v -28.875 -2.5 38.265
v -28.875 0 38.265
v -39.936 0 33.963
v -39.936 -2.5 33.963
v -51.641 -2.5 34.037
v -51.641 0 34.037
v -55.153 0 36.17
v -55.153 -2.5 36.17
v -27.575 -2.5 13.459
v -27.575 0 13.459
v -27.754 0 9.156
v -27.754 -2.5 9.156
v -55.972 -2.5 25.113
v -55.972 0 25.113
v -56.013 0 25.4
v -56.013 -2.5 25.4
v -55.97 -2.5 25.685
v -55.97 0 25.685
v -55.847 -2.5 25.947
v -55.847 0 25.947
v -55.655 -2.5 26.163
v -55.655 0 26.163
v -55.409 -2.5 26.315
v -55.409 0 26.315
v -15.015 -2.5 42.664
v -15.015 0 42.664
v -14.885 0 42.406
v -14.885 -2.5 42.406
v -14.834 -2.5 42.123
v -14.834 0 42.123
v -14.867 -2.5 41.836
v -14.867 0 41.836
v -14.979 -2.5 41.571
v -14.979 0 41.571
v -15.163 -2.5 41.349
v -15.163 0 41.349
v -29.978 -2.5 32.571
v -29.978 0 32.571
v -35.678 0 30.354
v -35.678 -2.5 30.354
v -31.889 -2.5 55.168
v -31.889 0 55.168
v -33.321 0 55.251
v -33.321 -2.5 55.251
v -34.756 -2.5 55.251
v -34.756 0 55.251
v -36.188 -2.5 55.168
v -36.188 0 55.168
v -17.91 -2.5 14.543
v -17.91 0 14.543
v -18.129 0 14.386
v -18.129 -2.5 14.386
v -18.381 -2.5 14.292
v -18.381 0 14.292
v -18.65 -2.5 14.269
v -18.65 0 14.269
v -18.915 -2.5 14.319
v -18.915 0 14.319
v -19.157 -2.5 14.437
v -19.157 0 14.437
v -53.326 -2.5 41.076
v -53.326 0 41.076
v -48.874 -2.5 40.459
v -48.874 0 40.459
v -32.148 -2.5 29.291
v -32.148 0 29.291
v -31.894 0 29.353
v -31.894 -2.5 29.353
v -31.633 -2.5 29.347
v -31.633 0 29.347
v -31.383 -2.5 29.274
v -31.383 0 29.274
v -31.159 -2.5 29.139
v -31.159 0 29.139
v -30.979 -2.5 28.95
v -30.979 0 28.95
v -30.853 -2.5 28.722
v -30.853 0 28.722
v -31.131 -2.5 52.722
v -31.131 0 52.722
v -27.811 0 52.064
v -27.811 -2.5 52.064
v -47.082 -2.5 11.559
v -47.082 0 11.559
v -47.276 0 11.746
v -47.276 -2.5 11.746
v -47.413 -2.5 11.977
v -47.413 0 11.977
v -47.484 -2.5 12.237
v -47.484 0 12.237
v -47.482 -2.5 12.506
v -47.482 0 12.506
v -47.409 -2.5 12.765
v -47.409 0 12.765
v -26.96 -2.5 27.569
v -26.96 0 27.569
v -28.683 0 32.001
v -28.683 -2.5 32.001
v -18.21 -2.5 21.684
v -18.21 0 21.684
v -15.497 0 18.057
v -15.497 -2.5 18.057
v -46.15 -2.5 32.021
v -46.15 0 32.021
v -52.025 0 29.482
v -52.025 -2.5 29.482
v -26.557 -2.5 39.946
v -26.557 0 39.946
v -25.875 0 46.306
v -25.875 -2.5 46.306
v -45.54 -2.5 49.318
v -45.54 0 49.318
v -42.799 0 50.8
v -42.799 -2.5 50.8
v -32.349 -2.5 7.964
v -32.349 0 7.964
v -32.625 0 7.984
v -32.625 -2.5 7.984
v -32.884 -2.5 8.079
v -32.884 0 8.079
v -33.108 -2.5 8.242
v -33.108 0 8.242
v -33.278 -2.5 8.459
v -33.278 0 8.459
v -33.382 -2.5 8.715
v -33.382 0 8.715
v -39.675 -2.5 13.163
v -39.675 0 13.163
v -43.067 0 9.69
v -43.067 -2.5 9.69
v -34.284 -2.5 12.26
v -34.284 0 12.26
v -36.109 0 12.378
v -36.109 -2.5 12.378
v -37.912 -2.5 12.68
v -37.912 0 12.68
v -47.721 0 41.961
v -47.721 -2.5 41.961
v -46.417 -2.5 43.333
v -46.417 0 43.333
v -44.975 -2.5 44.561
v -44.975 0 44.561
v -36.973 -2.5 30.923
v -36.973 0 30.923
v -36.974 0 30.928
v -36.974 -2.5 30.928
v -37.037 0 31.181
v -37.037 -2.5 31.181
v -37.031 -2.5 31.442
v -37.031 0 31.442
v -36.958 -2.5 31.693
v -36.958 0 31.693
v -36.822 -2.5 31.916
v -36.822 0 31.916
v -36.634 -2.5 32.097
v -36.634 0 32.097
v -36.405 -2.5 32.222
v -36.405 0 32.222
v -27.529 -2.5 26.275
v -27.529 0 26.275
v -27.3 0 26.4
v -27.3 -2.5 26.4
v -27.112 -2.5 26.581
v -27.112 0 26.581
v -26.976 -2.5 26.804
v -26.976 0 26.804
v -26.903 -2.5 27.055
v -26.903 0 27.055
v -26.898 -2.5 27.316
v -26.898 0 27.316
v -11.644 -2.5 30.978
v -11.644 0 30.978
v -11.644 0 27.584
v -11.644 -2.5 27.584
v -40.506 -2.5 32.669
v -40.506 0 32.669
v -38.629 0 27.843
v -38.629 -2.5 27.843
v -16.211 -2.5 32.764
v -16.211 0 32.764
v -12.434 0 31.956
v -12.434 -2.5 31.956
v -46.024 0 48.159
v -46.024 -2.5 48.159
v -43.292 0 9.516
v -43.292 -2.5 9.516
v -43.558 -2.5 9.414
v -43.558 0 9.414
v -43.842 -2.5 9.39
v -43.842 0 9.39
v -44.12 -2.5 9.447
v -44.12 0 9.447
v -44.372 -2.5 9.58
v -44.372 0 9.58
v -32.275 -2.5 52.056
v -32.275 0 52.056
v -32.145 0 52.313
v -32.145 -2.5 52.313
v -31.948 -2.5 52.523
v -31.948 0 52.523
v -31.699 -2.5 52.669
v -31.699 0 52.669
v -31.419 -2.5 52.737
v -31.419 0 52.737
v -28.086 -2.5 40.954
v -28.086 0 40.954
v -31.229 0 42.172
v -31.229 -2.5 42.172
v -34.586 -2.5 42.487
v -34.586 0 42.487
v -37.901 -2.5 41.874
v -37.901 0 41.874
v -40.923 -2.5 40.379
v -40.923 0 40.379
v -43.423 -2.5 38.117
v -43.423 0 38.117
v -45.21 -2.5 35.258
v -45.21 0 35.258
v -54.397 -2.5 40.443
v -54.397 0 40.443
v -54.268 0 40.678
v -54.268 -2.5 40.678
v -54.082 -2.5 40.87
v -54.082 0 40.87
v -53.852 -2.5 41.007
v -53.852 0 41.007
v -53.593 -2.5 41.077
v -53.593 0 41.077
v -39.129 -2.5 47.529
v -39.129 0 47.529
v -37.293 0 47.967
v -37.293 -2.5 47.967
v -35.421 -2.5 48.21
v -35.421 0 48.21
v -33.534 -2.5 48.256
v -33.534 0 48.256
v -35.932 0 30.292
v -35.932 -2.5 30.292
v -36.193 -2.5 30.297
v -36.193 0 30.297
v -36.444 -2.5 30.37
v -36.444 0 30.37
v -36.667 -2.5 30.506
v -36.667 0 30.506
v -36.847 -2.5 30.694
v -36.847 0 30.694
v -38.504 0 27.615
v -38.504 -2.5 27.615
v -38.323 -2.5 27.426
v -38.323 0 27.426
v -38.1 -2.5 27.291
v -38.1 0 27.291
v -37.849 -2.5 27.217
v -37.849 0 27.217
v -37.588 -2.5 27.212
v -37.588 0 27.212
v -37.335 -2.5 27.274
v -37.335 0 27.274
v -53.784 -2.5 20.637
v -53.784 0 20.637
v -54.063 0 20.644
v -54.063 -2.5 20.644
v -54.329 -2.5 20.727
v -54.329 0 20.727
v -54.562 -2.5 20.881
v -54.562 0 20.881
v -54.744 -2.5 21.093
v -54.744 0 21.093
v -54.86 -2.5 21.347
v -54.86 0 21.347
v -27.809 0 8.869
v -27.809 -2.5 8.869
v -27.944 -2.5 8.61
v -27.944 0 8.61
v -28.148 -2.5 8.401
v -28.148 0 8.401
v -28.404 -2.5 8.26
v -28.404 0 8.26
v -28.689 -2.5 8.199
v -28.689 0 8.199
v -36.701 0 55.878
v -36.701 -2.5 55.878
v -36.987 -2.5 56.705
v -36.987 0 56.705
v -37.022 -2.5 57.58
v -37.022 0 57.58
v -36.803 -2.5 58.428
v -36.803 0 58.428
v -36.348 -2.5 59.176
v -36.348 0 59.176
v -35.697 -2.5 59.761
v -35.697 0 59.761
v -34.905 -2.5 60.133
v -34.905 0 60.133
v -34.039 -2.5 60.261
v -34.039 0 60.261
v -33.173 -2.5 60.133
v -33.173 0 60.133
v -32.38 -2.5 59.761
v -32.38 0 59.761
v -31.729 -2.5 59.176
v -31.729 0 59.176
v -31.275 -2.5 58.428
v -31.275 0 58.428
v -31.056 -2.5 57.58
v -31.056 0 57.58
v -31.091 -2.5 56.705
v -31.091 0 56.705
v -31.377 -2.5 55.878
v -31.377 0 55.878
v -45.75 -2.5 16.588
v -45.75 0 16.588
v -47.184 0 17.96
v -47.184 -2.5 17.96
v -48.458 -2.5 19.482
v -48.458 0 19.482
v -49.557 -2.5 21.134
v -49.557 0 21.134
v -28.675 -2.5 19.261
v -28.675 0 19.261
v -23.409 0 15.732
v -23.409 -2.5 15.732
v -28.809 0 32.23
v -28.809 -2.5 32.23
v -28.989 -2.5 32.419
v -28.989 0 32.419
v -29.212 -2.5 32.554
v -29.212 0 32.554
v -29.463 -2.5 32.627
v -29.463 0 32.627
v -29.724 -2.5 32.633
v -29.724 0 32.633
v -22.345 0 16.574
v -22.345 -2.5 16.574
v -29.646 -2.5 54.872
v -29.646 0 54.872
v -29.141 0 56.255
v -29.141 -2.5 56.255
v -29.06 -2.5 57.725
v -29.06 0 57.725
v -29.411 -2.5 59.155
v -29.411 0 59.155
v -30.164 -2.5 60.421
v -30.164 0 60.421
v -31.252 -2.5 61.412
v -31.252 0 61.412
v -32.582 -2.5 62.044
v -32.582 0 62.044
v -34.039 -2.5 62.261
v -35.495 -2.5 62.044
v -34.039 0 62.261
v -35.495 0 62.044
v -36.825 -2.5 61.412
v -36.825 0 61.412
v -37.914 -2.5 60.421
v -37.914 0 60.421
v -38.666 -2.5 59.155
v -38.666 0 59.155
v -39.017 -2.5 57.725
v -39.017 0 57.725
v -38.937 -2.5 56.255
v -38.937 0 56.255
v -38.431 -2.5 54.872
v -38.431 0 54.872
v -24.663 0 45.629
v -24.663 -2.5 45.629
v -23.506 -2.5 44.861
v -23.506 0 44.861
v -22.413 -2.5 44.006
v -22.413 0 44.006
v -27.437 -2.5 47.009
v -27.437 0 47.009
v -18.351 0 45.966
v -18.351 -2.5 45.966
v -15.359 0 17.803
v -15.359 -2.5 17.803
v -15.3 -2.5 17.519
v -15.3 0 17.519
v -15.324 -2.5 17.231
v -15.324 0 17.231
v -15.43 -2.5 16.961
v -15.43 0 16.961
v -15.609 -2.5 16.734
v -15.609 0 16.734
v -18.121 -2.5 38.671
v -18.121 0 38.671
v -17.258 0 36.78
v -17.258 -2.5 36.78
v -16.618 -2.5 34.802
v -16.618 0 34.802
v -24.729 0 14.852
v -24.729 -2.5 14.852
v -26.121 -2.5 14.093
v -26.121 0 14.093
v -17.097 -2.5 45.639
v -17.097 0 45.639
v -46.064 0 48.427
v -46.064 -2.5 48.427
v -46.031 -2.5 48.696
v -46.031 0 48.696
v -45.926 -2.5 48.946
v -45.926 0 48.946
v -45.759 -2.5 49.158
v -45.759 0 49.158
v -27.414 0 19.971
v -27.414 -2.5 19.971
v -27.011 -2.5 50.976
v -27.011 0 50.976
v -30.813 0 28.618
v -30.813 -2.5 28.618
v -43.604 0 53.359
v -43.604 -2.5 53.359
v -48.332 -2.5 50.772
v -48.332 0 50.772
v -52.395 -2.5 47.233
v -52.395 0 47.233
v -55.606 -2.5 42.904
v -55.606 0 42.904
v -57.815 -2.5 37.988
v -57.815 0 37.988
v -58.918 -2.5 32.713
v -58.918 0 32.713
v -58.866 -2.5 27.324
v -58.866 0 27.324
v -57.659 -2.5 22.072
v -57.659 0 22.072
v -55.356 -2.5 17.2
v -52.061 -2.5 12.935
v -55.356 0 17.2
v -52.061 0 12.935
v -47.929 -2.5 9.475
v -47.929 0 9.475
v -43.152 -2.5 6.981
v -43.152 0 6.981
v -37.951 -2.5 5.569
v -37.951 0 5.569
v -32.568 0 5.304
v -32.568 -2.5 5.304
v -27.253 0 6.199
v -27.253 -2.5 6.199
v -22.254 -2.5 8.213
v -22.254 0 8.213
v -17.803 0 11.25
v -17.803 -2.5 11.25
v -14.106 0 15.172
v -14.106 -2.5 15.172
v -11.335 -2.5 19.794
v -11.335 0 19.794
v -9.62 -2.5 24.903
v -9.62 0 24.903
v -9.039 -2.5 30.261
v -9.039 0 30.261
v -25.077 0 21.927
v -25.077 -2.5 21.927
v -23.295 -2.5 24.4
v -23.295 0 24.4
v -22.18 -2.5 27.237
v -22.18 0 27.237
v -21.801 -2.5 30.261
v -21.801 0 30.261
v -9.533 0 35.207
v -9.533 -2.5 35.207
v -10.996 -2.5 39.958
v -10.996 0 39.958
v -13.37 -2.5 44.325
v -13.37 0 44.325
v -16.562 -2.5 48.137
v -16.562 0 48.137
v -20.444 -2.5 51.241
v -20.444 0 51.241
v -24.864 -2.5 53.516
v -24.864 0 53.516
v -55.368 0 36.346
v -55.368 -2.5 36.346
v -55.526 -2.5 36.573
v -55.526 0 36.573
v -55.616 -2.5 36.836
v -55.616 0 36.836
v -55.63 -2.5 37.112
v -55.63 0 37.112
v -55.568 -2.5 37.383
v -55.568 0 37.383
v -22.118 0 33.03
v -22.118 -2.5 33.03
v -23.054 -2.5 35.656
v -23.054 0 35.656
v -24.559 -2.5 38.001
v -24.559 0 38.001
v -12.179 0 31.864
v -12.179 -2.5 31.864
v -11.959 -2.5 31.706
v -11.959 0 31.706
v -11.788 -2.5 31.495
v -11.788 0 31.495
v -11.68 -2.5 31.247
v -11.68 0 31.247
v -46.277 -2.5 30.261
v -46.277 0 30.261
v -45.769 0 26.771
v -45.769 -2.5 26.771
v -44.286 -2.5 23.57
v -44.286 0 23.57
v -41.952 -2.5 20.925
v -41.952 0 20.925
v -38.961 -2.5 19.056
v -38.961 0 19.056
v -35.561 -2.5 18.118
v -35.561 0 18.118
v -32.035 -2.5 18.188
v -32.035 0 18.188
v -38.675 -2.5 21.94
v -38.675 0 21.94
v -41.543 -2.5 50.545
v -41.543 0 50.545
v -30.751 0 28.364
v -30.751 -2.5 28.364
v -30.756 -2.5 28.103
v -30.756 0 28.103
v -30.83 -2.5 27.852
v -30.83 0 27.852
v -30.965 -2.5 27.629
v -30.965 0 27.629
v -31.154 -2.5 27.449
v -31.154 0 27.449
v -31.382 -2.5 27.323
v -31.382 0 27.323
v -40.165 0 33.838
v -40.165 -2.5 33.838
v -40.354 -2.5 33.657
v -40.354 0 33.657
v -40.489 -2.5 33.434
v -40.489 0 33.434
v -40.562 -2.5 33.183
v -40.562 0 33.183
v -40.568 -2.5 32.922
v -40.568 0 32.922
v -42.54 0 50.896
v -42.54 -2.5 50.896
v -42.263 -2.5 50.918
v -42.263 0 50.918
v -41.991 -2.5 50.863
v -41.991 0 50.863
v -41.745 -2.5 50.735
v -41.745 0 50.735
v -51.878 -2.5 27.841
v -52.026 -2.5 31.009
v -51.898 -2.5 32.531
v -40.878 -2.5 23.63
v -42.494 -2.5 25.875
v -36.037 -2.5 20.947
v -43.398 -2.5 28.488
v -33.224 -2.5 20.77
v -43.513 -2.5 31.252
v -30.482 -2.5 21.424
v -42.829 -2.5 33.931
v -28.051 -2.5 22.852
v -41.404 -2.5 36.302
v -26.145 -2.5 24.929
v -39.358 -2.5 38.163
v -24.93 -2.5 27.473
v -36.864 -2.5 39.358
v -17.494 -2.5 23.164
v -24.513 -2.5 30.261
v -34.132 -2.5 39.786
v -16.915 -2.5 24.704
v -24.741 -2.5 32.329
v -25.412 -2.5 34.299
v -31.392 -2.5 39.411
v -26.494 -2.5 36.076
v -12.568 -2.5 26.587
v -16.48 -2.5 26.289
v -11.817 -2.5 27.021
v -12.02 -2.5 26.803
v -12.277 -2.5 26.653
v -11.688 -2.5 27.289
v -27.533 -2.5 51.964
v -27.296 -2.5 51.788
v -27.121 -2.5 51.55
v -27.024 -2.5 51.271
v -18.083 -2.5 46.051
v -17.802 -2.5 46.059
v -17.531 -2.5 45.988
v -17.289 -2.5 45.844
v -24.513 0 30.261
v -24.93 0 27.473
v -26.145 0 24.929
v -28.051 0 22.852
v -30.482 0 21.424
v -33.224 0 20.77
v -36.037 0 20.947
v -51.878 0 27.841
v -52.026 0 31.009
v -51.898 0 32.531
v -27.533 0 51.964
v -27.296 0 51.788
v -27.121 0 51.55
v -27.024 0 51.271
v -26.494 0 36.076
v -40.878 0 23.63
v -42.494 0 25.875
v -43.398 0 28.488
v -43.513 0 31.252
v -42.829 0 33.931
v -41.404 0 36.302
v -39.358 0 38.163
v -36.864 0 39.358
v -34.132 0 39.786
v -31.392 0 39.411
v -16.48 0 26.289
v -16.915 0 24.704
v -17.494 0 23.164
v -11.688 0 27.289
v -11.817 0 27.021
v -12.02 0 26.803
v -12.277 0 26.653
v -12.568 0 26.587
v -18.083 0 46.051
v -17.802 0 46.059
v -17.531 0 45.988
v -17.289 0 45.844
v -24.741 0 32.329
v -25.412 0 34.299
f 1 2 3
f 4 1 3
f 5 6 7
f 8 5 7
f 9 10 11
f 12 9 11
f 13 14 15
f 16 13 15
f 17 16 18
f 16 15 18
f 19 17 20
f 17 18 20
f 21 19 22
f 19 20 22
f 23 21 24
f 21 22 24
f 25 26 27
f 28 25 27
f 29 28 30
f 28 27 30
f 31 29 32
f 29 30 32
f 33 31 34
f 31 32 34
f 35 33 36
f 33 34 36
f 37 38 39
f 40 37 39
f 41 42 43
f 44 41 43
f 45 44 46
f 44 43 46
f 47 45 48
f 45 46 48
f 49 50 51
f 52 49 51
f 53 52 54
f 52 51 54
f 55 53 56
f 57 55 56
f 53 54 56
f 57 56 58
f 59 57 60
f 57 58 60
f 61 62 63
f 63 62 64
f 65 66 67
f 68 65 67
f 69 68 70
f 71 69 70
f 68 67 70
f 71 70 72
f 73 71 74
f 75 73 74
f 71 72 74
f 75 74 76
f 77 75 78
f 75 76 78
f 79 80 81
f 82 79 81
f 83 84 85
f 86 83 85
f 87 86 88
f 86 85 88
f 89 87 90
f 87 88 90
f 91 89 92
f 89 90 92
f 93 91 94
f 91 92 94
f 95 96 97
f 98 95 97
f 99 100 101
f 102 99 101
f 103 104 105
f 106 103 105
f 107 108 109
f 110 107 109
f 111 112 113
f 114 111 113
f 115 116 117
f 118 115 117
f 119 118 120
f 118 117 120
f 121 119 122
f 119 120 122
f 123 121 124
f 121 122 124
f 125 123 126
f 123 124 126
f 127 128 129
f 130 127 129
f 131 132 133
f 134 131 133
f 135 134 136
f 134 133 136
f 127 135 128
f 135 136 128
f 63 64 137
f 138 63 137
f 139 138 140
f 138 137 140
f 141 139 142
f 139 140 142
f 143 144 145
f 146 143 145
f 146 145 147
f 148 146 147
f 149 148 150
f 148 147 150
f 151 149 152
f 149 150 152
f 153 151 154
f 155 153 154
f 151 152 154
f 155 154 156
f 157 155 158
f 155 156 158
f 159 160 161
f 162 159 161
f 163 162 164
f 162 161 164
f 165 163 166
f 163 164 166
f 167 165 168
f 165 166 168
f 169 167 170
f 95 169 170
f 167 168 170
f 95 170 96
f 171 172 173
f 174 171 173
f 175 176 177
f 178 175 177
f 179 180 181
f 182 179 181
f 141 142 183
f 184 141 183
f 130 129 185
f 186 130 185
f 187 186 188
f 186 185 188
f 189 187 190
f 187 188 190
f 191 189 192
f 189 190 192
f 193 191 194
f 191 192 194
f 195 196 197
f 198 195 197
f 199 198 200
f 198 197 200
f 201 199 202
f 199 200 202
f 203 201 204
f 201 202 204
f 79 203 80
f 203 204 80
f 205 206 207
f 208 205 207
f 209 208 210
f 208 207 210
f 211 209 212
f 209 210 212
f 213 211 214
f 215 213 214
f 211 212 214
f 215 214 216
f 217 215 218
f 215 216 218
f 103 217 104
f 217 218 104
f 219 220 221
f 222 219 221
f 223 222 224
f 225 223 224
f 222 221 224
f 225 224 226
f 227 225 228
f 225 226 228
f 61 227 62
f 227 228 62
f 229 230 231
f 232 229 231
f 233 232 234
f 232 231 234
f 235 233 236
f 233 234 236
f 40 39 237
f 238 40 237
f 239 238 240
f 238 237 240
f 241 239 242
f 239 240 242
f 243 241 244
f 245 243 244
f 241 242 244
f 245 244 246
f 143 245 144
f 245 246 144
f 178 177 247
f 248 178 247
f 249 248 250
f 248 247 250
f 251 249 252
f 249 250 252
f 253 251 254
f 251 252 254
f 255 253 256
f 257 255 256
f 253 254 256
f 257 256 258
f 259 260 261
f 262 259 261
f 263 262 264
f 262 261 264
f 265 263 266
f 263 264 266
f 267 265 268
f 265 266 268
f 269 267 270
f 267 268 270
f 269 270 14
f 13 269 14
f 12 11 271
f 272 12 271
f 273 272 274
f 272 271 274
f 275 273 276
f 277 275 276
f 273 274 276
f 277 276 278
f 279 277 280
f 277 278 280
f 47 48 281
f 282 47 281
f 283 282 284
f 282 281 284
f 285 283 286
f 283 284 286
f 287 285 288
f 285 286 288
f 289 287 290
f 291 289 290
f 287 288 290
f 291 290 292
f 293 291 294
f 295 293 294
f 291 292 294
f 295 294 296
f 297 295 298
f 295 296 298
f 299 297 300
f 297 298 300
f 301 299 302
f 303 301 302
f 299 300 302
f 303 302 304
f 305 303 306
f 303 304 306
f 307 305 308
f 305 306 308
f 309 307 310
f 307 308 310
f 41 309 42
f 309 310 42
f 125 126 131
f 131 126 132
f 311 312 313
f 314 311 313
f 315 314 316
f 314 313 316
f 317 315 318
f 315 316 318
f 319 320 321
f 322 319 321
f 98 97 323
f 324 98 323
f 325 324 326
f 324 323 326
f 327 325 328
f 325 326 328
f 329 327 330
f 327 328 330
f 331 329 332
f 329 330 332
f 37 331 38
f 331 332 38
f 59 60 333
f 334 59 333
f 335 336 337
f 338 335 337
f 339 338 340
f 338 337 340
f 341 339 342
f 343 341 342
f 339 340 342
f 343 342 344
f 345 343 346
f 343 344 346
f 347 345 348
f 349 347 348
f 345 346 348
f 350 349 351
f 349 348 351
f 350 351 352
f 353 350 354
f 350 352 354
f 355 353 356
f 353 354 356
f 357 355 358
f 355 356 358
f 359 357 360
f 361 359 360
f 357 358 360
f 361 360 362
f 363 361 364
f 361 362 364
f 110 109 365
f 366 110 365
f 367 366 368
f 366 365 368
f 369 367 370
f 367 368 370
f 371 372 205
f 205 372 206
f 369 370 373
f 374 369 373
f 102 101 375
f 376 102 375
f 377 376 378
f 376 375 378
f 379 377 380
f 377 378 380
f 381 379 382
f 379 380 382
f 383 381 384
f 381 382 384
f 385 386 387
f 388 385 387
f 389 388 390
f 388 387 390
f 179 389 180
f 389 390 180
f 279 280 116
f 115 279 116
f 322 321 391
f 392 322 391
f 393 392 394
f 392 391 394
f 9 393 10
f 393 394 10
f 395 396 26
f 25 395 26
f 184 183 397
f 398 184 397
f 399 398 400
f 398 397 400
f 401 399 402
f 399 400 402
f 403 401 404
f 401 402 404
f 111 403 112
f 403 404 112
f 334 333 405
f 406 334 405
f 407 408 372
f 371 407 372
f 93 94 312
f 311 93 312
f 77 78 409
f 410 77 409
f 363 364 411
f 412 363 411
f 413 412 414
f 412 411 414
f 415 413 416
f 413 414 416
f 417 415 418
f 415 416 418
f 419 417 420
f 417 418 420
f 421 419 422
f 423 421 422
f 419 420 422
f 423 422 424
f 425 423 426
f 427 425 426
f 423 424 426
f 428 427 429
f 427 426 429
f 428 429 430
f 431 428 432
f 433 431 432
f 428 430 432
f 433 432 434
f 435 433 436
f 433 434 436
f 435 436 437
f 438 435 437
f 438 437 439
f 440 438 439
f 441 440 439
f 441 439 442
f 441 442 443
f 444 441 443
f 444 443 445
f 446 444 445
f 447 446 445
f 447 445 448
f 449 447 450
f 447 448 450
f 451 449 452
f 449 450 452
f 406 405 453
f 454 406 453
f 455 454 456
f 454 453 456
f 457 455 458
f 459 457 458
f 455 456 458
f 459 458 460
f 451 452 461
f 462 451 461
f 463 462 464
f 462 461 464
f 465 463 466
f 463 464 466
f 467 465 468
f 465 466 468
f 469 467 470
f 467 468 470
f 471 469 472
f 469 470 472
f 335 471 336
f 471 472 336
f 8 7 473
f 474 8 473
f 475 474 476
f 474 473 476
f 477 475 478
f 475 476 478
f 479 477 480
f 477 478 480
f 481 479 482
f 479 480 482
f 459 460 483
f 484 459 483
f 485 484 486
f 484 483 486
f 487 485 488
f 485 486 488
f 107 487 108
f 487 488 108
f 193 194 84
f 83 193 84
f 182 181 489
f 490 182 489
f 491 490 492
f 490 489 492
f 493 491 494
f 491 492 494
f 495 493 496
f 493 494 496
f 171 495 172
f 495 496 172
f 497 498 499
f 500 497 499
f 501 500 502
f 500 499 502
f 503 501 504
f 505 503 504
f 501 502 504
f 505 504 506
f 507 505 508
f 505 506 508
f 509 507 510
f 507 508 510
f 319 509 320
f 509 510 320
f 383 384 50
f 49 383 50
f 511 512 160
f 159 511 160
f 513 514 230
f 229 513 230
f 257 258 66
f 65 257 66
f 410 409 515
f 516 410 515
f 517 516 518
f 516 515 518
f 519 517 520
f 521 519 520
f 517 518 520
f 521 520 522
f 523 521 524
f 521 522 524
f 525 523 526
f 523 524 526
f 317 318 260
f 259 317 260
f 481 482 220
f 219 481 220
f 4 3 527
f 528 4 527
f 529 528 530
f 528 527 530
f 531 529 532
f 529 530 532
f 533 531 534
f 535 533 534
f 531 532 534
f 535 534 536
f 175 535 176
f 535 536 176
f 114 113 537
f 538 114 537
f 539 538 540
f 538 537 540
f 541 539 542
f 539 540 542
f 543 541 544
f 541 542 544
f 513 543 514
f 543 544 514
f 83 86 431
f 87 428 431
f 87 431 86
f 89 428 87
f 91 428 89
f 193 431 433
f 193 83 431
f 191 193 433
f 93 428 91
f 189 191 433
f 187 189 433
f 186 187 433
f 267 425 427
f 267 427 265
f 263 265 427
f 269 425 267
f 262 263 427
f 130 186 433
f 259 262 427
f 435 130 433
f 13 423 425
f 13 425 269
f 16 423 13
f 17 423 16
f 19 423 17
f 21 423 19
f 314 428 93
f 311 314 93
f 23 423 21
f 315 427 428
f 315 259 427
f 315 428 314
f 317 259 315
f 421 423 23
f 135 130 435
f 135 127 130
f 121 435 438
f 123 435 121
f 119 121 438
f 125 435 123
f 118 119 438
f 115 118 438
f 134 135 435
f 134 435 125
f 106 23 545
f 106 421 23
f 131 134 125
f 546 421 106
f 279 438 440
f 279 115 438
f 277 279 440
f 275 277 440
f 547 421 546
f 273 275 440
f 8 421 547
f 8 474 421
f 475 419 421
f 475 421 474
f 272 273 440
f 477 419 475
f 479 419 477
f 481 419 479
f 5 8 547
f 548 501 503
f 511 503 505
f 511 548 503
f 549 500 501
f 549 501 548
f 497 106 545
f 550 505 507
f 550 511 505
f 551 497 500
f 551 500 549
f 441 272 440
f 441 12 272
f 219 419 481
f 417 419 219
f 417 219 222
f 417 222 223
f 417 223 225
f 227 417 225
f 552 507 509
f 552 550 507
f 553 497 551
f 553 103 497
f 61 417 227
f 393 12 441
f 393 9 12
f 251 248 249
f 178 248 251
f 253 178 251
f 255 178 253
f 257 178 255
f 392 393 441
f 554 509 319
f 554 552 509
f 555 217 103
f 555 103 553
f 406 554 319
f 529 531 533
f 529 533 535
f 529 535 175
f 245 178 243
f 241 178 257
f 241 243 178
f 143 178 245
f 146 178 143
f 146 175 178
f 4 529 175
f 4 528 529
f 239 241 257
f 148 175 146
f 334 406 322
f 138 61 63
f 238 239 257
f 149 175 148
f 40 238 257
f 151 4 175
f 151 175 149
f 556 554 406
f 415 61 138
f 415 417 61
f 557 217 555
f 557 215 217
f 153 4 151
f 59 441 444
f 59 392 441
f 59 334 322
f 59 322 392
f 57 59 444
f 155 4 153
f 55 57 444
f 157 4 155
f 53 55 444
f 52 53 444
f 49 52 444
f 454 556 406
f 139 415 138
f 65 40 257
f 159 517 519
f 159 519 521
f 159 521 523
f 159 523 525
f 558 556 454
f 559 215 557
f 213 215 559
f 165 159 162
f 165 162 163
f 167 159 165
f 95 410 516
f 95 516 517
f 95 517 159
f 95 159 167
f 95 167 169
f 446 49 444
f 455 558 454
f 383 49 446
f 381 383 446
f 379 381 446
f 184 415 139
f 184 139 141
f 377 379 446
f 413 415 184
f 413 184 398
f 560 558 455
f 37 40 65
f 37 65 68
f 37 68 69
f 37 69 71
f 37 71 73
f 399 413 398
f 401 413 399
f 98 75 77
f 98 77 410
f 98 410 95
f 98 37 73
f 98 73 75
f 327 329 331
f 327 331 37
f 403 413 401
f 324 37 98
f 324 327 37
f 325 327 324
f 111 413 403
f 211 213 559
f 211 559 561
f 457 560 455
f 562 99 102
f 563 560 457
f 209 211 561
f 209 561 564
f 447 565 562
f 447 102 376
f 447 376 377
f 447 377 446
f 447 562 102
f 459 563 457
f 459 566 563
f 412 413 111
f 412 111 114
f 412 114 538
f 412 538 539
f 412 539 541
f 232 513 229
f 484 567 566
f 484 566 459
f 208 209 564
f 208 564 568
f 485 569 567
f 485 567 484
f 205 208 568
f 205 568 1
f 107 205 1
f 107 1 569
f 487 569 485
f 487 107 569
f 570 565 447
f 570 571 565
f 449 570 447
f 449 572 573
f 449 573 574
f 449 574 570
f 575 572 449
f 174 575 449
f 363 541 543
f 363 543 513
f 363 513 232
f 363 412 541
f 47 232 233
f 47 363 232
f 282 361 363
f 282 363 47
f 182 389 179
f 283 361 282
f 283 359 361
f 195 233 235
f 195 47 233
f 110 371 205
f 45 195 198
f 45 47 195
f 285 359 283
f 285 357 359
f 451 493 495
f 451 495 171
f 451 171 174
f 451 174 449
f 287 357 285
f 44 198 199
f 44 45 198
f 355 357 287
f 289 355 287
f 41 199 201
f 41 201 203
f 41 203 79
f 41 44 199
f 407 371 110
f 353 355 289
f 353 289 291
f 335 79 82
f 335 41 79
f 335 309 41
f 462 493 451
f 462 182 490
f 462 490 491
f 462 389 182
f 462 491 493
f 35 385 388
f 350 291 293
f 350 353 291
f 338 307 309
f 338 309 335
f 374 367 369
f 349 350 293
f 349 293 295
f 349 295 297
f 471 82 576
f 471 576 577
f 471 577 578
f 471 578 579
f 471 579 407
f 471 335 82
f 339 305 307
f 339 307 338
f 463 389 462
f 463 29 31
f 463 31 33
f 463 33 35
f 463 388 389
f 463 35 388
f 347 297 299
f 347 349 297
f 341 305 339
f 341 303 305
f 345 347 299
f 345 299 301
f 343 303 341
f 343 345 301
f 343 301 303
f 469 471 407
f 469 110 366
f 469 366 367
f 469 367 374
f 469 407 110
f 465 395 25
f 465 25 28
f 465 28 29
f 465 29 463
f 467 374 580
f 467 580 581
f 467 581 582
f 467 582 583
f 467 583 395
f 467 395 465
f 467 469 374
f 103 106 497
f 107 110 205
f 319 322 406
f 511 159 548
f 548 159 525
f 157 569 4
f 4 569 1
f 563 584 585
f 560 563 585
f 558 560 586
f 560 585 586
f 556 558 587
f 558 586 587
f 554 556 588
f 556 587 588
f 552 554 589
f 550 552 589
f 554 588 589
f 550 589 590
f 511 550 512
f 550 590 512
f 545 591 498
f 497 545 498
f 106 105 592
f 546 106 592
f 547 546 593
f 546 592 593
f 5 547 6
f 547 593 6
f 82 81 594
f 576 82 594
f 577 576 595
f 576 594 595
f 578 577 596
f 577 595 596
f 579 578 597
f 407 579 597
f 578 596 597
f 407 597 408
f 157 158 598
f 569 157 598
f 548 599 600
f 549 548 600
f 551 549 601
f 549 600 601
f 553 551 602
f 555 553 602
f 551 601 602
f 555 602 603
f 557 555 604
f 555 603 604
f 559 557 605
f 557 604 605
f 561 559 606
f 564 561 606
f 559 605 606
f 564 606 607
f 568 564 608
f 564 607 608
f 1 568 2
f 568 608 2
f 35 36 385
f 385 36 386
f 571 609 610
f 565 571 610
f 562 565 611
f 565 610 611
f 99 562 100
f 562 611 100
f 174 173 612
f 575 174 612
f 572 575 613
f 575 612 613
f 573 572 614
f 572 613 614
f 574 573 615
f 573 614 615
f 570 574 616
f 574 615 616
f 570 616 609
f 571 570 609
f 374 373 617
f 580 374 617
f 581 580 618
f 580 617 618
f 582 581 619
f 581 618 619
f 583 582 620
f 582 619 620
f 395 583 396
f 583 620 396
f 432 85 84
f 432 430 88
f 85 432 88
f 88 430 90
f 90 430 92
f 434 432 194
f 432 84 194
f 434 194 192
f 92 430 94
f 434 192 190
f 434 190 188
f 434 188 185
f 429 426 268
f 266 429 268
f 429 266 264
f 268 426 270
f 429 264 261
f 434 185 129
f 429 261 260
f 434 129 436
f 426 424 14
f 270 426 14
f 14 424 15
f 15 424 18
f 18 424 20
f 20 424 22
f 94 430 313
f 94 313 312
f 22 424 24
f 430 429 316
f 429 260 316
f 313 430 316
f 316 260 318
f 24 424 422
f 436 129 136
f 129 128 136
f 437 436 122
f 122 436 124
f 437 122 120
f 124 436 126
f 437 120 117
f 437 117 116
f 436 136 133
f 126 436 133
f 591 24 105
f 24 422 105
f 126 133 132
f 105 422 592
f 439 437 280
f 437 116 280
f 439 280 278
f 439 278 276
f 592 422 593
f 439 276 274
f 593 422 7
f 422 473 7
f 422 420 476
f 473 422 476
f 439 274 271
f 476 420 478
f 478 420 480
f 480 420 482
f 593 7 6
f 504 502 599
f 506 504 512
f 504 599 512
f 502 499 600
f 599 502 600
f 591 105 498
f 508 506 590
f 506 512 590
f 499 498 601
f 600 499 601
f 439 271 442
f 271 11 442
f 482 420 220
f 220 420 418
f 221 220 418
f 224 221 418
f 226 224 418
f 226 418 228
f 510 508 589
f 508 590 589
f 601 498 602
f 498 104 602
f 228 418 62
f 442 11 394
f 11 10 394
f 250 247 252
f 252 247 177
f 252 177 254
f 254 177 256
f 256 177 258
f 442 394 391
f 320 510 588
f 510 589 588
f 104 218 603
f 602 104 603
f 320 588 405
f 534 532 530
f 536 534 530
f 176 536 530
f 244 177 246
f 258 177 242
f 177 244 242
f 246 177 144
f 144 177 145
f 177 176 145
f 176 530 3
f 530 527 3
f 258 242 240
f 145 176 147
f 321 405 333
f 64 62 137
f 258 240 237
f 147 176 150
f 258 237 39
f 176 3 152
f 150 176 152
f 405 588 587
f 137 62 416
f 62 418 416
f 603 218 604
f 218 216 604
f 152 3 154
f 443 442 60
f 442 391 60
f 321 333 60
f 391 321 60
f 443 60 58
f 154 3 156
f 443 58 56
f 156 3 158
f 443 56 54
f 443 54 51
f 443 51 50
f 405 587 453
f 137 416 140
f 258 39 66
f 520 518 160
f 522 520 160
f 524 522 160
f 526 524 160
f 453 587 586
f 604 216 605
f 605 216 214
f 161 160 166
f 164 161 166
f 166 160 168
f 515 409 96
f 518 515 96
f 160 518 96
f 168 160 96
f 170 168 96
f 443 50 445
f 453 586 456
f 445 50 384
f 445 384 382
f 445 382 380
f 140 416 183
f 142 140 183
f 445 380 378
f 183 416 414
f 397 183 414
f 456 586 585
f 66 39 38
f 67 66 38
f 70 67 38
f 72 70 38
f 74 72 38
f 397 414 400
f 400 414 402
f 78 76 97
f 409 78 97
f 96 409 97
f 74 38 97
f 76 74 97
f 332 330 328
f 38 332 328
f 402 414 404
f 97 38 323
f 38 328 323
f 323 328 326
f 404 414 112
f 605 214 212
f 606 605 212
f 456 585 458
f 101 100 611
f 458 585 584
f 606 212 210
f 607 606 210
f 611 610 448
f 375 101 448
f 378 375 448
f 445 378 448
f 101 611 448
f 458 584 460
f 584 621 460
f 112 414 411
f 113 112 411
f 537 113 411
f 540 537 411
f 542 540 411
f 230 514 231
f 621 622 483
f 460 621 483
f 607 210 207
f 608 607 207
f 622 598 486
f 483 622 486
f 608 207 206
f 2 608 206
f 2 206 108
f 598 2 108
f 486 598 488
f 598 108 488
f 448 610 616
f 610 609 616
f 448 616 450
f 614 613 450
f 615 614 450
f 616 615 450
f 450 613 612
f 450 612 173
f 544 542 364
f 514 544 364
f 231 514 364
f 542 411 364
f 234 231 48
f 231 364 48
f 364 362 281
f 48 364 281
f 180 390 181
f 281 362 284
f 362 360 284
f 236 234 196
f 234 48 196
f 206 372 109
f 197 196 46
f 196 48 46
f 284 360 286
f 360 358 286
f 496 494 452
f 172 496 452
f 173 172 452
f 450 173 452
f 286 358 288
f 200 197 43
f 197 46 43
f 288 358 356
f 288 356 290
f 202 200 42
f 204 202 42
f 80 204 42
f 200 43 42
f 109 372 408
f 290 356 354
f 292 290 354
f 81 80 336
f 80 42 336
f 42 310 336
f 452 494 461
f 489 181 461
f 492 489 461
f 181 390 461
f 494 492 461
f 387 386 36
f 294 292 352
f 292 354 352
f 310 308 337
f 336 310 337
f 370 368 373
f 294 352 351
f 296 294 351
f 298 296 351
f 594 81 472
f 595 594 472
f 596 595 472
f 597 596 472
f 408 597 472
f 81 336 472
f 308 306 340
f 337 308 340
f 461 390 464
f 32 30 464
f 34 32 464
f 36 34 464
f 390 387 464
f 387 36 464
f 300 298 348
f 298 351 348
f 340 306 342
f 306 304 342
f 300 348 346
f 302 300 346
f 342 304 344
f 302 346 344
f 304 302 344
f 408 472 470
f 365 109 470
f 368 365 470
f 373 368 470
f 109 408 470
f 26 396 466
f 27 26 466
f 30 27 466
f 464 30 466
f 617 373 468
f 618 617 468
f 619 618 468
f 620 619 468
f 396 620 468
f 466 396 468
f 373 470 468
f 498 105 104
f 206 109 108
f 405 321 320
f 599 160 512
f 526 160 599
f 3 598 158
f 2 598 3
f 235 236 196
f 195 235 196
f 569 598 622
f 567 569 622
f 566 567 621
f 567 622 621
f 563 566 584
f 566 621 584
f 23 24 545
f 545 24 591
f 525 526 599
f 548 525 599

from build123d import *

# Parameters (mm, degrees)
F1_DEPTH = 2.5


with BuildPart() as f1:
    # F0 (on Front) → F1 (new body)
    with BuildSketch(Plane.XZ):
        with BuildLine():
            ThreePointArc((-38.431176, 54.871997), (-50.088537, 11.093074), (-9.038772, 30.260886))
            ThreePointArc((-9.038772, 30.260886), (-14.870959, 46.310651), (-29.646368, 54.871997))
            ThreePointArc((-29.646368, 54.871997), (-30.764385, 55.045527), (-31.889108, 55.168294))
            ThreePointArc((-31.889108, 55.168294), (-34.038772, 55.260886), (-36.188436, 55.168294))
            ThreePointArc((-36.188436, 55.168294), (-37.313159, 55.045527), (-38.431176, 54.871997))
        make_face()
        with BuildLine():
            ThreePointArc((-27.436737, 47.009275), (-26.647389, 46.676209), (-25.87478, 46.305967))
            ThreePointArc((-25.87478, 46.305967), (-24.07711, 45.256241), (-22.412639, 44.006009))
            Line((-22.412639, 44.006009), (-18.351048, 45.966118))
            ThreePointArc((-18.351048, 45.966118), (-17.663958, 46.033117), (-17.097186, 45.638972))
            Line((-17.097186, 45.638972), (-15.014567, 42.663804))
            ThreePointArc((-15.014567, 42.663804), (-14.840086, 41.978378), (-15.162712, 41.348962))
            Line((-15.162712, 41.348962), (-18.121272, 38.670913))
            ThreePointArc((-18.121272, 38.670913), (-16.90955, 35.800301), (-16.210955, 32.76375))
            Line((-16.210955, 32.76375), (-12.434427, 31.955754))
            ThreePointArc((-12.434427, 31.955754), (-11.866078, 31.606687), (-11.643643, 30.977885))
            Line((-11.643643, 30.977885), (-11.643643, 27.583928))
            ThreePointArc((-11.643643, 27.583928), (-11.910209, 26.904168), (-12.567791, 26.586809))
            Line((-12.567791, 26.586809), (-16.479693, 26.289224))
            ThreePointArc((-16.479693, 26.289224), (-17.186984, 23.927433), (-18.210327, 21.684425))
            Line((-18.210327, 21.684425), (-15.497295, 18.057033))
            ThreePointArc((-15.497295, 18.057033), (-15.301617, 17.374188), (-15.608727, 16.733679))
            Line((-15.608727, 16.733679), (-17.910432, 14.543347))
            ThreePointArc((-17.910432, 14.543347), (-18.514805, 14.271381), (-19.156508, 14.437057))
            Line((-19.156508, 14.437057), (-22.344594, 16.573609))
            ThreePointArc((-22.344594, 16.573609), (-22.868647, 16.142682), (-23.408566, 15.731809))
            ThreePointArc((-23.408566, 15.731809), (-25.41665, 14.457267), (-27.575226, 13.458566))
            Line((-27.575226, 13.458566), (-27.754484, 9.155613))
            ThreePointArc((-27.754484, 9.155613), (-28.038559, 8.498171), (-28.689408, 8.1993))
            Line((-28.689408, 8.1993), (-32.349118, 7.963827))
            ThreePointArc((-32.349118, 7.963827), (-33.001423, 8.152972), (-33.382452, 8.715194))
            Line((-33.382452, 8.715194), (-34.284313, 12.259912))
            ThreePointArc((-34.284313, 12.259912), (-37.014387, 12.505856), (-39.675475, 13.163432))
            Line((-39.675475, 13.163432), (-43.06656, 9.689531))
            ThreePointArc((-43.06656, 9.689531), (-43.698851, 9.391531), (-44.37184, 9.58043))
            Line((-44.37184, 9.58043), (-47.081775, 11.559113))
            ThreePointArc((-47.081775, 11.559113), (-47.457092, 12.104536), (-47.409397, 12.764896))
            Line((-47.409397, 12.764896), (-45.749935, 16.588138))
            ThreePointArc((-45.749935, 16.588138), (-47.841741, 18.70349), (-49.556617, 21.13445))
            Line((-49.556617, 21.13445), (-53.783735, 20.637289))
            ThreePointArc((-53.783735, 20.637289), (-54.451336, 20.795802), (-54.859614, 21.347279))
            Line((-54.859614, 21.347279), (-55.971582, 25.113494))
            ThreePointArc((-55.971582, 25.113494), (-55.918151, 25.820704), (-55.409183, 26.314619))
            Line((-55.409183, 26.314619), (-51.877978, 27.840539))
            ThreePointArc((-51.877978, 27.840539), (-51.97007, 28.659657), (-52.024569, 29.482132))
            ThreePointArc((-52.024569, 29.482132), (-51.977915, 31.771688), (-51.640984, 34.036798))
            Line((-51.640984, 34.036798), (-55.153296, 36.170466))
            ThreePointArc((-55.153296, 36.170466), (-55.58025, 36.701378), (-55.568044, 37.382559))
            Line((-55.568044, 37.382559), (-54.396808, 40.442881))
            ThreePointArc((-54.396808, 40.442881), (-53.971652, 40.946342), (-53.325566, 41.075976))
            Line((-53.325566, 41.075976), (-48.874356, 40.458966))
            ThreePointArc((-48.874356, 40.458966), (-47.087004, 42.664072), (-44.97527, 44.56083))
            Line((-44.97527, 44.56083), (-46.024426, 48.158616))
            ThreePointArc((-46.024426, 48.158616), (-45.98712, 48.824068), (-45.539929, 49.318274))
            Line((-45.539929, 49.318274), (-42.799457, 50.79961))
            ThreePointArc((-42.799457, 50.79961), (-42.125143, 50.899944), (-41.543224, 50.544788))
            Line((-41.543224, 50.544788), (-39.129262, 47.528842))
            ThreePointArc((-39.129262, 47.528842), (-36.360365, 48.113213), (-33.534103, 48.25646))
            Line((-33.534103, 48.25646), (-32.274634, 52.055594))
            ThreePointArc((-32.274634, 52.055594), (-31.828789, 52.605), (-31.130951, 52.721826))
            Line((-31.130951, 52.721826), (-27.811196, 52.06362))
            ThreePointArc((-27.811196, 52.06362), (-27.200088, 51.675185), (-27.01138, 50.976096))
            Line((-27.01138, 50.976096), (-27.436737, 47.009275))
        make_face(mode=Mode.SUBTRACT)
        with BuildLine():
            ThreePointArc((-31.889108, 55.168294), (-30.764385, 55.045527), (-29.646368, 54.871997))
            ThreePointArc((-29.646368, 54.871997), (-34.038772, 62.260886), (-38.431176, 54.871997))
            ThreePointArc((-38.431176, 54.871997), (-37.313159, 55.045527), (-36.188436, 55.168294))
            ThreePointArc((-36.188436, 55.168294), (-34.038772, 60.260886), (-31.889108, 55.168294))
        make_face()
        with BuildLine():
            ThreePointArc((-27.413909, 19.970899), (-23.295197, 24.400149), (-21.800608, 30.260886))
            ThreePointArc((-21.800608, 30.260886), (-23.053822, 35.655654), (-26.556799, 39.945551))
            ThreePointArc((-26.556799, 39.945551), (-27.302541, 40.478314), (-28.086061, 40.953775))
            ThreePointArc((-28.086061, 40.953775), (-39.463766, 41.230941), (-46.149733, 32.020793))
            ThreePointArc((-46.149733, 32.020793), (-46.245093, 31.143135), (-46.276935, 30.260886))
            ThreePointArc((-46.276935, 30.260886), (-40.524346, 19.882545), (-28.674625, 19.260951))
            ThreePointArc((-28.674625, 19.260951), (-28.033766, 19.597278), (-27.413909, 19.970899))
        make_face()
        with BuildLine():
            ThreePointArc((-26.494493, 36.076328), (-25.022157, 33.332721), (-24.513253, 30.260886))
            ThreePointArc((-24.513253, 30.260886), (-29.213352, 22.04804), (-38.675386, 21.939989))
            ThreePointArc((-38.675386, 21.939989), (-39.838521, 22.704536), (-40.877817, 23.630428))
            ThreePointArc((-40.877817, 23.630428), (-41.403861, 36.301662), (-28.874619, 38.265076))
            ThreePointArc((-28.874619, 38.265076), (-27.591004, 37.272434), (-26.494493, 36.076328))
        make_face(mode=Mode.SUBTRACT)
        with BuildLine():
            ThreePointArc((-46.276935, 30.260886), (-46.245093, 31.143135), (-46.149733, 32.020793))
            Line((-46.149733, 32.020793), (-52.024569, 29.482132))
            ThreePointArc((-52.024569, 29.482132), (-51.97007, 28.659657), (-51.877978, 27.840539))
            Line((-51.877978, 27.840539), (-46.276935, 30.260886))
        make_face()
        with BuildLine():
            Line((-22.344594, 16.573609), (-27.413909, 19.970899))
            ThreePointArc((-27.413909, 19.970899), (-28.033766, 19.597278), (-28.674625, 19.260951))
            Line((-28.674625, 19.260951), (-23.408566, 15.731809))
            ThreePointArc((-23.408566, 15.731809), (-22.868647, 16.142682), (-22.344594, 16.573609))
        make_face()
        with BuildLine():
            ThreePointArc((-28.086061, 40.953775), (-27.302541, 40.478314), (-26.556799, 39.945551))
            Line((-26.556799, 39.945551), (-25.87478, 46.305967))
            ThreePointArc((-25.87478, 46.305967), (-26.647389, 46.676209), (-27.436737, 47.009275))
            Line((-27.436737, 47.009275), (-28.086061, 40.953775))
        make_face()
        with BuildLine():
            Line((-36.404948, 32.222135), (-26.494493, 36.076328))
            ThreePointArc((-26.494493, 36.076328), (-27.591004, 37.272434), (-28.874619, 38.265076))
            Line((-28.874619, 38.265076), (-39.936242, 33.963191))
            ThreePointArc((-39.936242, 33.963191), (-40.489105, 33.433919), (-40.505786, 32.668734))
            Line((-40.505786, 32.668734), (-38.629208, 27.843408))
            ThreePointArc((-38.629208, 27.843408), (-38.099936, 27.290545), (-37.334751, 27.273864))
            Line((-37.334751, 27.273864), (-32.147718, 29.29111))
            ThreePointArc((-32.147718, 29.29111), (-31.382533, 29.274429), (-30.853261, 28.721566))
            Line((-30.853261, 28.721566), (-30.812855, 28.61767))
            ThreePointArc((-30.812855, 28.61767), (-30.829537, 27.852485), (-31.382399, 27.323213))
            Line((-31.382399, 27.323213), (-40.877817, 23.630428))
            ThreePointArc((-40.877817, 23.630428), (-39.838521, 22.704536), (-38.675386, 21.939989))
            Line((-38.675386, 21.939989), (-27.529152, 26.274779))
            ThreePointArc((-27.529152, 26.274779), (-26.976289, 26.804052), (-26.959608, 27.569237))
            Line((-26.959608, 27.569237), (-28.683195, 32.001171))
            ThreePointArc((-28.683195, 32.001171), (-29.212468, 32.554034), (-29.977653, 32.570715))
            Line((-29.977653, 32.570715), (-35.678317, 30.353717))
            ThreePointArc((-35.678317, 30.353717), (-36.443502, 30.370398), (-36.972774, 30.923261))
            Line((-36.972774, 30.923261), (-36.974492, 30.927678))
            ThreePointArc((-36.974492, 30.927678), (-36.957811, 31.692863), (-36.404948, 32.222135))
        make_face()
    extrude(amount=F1_DEPTH)


solid = f1.part
